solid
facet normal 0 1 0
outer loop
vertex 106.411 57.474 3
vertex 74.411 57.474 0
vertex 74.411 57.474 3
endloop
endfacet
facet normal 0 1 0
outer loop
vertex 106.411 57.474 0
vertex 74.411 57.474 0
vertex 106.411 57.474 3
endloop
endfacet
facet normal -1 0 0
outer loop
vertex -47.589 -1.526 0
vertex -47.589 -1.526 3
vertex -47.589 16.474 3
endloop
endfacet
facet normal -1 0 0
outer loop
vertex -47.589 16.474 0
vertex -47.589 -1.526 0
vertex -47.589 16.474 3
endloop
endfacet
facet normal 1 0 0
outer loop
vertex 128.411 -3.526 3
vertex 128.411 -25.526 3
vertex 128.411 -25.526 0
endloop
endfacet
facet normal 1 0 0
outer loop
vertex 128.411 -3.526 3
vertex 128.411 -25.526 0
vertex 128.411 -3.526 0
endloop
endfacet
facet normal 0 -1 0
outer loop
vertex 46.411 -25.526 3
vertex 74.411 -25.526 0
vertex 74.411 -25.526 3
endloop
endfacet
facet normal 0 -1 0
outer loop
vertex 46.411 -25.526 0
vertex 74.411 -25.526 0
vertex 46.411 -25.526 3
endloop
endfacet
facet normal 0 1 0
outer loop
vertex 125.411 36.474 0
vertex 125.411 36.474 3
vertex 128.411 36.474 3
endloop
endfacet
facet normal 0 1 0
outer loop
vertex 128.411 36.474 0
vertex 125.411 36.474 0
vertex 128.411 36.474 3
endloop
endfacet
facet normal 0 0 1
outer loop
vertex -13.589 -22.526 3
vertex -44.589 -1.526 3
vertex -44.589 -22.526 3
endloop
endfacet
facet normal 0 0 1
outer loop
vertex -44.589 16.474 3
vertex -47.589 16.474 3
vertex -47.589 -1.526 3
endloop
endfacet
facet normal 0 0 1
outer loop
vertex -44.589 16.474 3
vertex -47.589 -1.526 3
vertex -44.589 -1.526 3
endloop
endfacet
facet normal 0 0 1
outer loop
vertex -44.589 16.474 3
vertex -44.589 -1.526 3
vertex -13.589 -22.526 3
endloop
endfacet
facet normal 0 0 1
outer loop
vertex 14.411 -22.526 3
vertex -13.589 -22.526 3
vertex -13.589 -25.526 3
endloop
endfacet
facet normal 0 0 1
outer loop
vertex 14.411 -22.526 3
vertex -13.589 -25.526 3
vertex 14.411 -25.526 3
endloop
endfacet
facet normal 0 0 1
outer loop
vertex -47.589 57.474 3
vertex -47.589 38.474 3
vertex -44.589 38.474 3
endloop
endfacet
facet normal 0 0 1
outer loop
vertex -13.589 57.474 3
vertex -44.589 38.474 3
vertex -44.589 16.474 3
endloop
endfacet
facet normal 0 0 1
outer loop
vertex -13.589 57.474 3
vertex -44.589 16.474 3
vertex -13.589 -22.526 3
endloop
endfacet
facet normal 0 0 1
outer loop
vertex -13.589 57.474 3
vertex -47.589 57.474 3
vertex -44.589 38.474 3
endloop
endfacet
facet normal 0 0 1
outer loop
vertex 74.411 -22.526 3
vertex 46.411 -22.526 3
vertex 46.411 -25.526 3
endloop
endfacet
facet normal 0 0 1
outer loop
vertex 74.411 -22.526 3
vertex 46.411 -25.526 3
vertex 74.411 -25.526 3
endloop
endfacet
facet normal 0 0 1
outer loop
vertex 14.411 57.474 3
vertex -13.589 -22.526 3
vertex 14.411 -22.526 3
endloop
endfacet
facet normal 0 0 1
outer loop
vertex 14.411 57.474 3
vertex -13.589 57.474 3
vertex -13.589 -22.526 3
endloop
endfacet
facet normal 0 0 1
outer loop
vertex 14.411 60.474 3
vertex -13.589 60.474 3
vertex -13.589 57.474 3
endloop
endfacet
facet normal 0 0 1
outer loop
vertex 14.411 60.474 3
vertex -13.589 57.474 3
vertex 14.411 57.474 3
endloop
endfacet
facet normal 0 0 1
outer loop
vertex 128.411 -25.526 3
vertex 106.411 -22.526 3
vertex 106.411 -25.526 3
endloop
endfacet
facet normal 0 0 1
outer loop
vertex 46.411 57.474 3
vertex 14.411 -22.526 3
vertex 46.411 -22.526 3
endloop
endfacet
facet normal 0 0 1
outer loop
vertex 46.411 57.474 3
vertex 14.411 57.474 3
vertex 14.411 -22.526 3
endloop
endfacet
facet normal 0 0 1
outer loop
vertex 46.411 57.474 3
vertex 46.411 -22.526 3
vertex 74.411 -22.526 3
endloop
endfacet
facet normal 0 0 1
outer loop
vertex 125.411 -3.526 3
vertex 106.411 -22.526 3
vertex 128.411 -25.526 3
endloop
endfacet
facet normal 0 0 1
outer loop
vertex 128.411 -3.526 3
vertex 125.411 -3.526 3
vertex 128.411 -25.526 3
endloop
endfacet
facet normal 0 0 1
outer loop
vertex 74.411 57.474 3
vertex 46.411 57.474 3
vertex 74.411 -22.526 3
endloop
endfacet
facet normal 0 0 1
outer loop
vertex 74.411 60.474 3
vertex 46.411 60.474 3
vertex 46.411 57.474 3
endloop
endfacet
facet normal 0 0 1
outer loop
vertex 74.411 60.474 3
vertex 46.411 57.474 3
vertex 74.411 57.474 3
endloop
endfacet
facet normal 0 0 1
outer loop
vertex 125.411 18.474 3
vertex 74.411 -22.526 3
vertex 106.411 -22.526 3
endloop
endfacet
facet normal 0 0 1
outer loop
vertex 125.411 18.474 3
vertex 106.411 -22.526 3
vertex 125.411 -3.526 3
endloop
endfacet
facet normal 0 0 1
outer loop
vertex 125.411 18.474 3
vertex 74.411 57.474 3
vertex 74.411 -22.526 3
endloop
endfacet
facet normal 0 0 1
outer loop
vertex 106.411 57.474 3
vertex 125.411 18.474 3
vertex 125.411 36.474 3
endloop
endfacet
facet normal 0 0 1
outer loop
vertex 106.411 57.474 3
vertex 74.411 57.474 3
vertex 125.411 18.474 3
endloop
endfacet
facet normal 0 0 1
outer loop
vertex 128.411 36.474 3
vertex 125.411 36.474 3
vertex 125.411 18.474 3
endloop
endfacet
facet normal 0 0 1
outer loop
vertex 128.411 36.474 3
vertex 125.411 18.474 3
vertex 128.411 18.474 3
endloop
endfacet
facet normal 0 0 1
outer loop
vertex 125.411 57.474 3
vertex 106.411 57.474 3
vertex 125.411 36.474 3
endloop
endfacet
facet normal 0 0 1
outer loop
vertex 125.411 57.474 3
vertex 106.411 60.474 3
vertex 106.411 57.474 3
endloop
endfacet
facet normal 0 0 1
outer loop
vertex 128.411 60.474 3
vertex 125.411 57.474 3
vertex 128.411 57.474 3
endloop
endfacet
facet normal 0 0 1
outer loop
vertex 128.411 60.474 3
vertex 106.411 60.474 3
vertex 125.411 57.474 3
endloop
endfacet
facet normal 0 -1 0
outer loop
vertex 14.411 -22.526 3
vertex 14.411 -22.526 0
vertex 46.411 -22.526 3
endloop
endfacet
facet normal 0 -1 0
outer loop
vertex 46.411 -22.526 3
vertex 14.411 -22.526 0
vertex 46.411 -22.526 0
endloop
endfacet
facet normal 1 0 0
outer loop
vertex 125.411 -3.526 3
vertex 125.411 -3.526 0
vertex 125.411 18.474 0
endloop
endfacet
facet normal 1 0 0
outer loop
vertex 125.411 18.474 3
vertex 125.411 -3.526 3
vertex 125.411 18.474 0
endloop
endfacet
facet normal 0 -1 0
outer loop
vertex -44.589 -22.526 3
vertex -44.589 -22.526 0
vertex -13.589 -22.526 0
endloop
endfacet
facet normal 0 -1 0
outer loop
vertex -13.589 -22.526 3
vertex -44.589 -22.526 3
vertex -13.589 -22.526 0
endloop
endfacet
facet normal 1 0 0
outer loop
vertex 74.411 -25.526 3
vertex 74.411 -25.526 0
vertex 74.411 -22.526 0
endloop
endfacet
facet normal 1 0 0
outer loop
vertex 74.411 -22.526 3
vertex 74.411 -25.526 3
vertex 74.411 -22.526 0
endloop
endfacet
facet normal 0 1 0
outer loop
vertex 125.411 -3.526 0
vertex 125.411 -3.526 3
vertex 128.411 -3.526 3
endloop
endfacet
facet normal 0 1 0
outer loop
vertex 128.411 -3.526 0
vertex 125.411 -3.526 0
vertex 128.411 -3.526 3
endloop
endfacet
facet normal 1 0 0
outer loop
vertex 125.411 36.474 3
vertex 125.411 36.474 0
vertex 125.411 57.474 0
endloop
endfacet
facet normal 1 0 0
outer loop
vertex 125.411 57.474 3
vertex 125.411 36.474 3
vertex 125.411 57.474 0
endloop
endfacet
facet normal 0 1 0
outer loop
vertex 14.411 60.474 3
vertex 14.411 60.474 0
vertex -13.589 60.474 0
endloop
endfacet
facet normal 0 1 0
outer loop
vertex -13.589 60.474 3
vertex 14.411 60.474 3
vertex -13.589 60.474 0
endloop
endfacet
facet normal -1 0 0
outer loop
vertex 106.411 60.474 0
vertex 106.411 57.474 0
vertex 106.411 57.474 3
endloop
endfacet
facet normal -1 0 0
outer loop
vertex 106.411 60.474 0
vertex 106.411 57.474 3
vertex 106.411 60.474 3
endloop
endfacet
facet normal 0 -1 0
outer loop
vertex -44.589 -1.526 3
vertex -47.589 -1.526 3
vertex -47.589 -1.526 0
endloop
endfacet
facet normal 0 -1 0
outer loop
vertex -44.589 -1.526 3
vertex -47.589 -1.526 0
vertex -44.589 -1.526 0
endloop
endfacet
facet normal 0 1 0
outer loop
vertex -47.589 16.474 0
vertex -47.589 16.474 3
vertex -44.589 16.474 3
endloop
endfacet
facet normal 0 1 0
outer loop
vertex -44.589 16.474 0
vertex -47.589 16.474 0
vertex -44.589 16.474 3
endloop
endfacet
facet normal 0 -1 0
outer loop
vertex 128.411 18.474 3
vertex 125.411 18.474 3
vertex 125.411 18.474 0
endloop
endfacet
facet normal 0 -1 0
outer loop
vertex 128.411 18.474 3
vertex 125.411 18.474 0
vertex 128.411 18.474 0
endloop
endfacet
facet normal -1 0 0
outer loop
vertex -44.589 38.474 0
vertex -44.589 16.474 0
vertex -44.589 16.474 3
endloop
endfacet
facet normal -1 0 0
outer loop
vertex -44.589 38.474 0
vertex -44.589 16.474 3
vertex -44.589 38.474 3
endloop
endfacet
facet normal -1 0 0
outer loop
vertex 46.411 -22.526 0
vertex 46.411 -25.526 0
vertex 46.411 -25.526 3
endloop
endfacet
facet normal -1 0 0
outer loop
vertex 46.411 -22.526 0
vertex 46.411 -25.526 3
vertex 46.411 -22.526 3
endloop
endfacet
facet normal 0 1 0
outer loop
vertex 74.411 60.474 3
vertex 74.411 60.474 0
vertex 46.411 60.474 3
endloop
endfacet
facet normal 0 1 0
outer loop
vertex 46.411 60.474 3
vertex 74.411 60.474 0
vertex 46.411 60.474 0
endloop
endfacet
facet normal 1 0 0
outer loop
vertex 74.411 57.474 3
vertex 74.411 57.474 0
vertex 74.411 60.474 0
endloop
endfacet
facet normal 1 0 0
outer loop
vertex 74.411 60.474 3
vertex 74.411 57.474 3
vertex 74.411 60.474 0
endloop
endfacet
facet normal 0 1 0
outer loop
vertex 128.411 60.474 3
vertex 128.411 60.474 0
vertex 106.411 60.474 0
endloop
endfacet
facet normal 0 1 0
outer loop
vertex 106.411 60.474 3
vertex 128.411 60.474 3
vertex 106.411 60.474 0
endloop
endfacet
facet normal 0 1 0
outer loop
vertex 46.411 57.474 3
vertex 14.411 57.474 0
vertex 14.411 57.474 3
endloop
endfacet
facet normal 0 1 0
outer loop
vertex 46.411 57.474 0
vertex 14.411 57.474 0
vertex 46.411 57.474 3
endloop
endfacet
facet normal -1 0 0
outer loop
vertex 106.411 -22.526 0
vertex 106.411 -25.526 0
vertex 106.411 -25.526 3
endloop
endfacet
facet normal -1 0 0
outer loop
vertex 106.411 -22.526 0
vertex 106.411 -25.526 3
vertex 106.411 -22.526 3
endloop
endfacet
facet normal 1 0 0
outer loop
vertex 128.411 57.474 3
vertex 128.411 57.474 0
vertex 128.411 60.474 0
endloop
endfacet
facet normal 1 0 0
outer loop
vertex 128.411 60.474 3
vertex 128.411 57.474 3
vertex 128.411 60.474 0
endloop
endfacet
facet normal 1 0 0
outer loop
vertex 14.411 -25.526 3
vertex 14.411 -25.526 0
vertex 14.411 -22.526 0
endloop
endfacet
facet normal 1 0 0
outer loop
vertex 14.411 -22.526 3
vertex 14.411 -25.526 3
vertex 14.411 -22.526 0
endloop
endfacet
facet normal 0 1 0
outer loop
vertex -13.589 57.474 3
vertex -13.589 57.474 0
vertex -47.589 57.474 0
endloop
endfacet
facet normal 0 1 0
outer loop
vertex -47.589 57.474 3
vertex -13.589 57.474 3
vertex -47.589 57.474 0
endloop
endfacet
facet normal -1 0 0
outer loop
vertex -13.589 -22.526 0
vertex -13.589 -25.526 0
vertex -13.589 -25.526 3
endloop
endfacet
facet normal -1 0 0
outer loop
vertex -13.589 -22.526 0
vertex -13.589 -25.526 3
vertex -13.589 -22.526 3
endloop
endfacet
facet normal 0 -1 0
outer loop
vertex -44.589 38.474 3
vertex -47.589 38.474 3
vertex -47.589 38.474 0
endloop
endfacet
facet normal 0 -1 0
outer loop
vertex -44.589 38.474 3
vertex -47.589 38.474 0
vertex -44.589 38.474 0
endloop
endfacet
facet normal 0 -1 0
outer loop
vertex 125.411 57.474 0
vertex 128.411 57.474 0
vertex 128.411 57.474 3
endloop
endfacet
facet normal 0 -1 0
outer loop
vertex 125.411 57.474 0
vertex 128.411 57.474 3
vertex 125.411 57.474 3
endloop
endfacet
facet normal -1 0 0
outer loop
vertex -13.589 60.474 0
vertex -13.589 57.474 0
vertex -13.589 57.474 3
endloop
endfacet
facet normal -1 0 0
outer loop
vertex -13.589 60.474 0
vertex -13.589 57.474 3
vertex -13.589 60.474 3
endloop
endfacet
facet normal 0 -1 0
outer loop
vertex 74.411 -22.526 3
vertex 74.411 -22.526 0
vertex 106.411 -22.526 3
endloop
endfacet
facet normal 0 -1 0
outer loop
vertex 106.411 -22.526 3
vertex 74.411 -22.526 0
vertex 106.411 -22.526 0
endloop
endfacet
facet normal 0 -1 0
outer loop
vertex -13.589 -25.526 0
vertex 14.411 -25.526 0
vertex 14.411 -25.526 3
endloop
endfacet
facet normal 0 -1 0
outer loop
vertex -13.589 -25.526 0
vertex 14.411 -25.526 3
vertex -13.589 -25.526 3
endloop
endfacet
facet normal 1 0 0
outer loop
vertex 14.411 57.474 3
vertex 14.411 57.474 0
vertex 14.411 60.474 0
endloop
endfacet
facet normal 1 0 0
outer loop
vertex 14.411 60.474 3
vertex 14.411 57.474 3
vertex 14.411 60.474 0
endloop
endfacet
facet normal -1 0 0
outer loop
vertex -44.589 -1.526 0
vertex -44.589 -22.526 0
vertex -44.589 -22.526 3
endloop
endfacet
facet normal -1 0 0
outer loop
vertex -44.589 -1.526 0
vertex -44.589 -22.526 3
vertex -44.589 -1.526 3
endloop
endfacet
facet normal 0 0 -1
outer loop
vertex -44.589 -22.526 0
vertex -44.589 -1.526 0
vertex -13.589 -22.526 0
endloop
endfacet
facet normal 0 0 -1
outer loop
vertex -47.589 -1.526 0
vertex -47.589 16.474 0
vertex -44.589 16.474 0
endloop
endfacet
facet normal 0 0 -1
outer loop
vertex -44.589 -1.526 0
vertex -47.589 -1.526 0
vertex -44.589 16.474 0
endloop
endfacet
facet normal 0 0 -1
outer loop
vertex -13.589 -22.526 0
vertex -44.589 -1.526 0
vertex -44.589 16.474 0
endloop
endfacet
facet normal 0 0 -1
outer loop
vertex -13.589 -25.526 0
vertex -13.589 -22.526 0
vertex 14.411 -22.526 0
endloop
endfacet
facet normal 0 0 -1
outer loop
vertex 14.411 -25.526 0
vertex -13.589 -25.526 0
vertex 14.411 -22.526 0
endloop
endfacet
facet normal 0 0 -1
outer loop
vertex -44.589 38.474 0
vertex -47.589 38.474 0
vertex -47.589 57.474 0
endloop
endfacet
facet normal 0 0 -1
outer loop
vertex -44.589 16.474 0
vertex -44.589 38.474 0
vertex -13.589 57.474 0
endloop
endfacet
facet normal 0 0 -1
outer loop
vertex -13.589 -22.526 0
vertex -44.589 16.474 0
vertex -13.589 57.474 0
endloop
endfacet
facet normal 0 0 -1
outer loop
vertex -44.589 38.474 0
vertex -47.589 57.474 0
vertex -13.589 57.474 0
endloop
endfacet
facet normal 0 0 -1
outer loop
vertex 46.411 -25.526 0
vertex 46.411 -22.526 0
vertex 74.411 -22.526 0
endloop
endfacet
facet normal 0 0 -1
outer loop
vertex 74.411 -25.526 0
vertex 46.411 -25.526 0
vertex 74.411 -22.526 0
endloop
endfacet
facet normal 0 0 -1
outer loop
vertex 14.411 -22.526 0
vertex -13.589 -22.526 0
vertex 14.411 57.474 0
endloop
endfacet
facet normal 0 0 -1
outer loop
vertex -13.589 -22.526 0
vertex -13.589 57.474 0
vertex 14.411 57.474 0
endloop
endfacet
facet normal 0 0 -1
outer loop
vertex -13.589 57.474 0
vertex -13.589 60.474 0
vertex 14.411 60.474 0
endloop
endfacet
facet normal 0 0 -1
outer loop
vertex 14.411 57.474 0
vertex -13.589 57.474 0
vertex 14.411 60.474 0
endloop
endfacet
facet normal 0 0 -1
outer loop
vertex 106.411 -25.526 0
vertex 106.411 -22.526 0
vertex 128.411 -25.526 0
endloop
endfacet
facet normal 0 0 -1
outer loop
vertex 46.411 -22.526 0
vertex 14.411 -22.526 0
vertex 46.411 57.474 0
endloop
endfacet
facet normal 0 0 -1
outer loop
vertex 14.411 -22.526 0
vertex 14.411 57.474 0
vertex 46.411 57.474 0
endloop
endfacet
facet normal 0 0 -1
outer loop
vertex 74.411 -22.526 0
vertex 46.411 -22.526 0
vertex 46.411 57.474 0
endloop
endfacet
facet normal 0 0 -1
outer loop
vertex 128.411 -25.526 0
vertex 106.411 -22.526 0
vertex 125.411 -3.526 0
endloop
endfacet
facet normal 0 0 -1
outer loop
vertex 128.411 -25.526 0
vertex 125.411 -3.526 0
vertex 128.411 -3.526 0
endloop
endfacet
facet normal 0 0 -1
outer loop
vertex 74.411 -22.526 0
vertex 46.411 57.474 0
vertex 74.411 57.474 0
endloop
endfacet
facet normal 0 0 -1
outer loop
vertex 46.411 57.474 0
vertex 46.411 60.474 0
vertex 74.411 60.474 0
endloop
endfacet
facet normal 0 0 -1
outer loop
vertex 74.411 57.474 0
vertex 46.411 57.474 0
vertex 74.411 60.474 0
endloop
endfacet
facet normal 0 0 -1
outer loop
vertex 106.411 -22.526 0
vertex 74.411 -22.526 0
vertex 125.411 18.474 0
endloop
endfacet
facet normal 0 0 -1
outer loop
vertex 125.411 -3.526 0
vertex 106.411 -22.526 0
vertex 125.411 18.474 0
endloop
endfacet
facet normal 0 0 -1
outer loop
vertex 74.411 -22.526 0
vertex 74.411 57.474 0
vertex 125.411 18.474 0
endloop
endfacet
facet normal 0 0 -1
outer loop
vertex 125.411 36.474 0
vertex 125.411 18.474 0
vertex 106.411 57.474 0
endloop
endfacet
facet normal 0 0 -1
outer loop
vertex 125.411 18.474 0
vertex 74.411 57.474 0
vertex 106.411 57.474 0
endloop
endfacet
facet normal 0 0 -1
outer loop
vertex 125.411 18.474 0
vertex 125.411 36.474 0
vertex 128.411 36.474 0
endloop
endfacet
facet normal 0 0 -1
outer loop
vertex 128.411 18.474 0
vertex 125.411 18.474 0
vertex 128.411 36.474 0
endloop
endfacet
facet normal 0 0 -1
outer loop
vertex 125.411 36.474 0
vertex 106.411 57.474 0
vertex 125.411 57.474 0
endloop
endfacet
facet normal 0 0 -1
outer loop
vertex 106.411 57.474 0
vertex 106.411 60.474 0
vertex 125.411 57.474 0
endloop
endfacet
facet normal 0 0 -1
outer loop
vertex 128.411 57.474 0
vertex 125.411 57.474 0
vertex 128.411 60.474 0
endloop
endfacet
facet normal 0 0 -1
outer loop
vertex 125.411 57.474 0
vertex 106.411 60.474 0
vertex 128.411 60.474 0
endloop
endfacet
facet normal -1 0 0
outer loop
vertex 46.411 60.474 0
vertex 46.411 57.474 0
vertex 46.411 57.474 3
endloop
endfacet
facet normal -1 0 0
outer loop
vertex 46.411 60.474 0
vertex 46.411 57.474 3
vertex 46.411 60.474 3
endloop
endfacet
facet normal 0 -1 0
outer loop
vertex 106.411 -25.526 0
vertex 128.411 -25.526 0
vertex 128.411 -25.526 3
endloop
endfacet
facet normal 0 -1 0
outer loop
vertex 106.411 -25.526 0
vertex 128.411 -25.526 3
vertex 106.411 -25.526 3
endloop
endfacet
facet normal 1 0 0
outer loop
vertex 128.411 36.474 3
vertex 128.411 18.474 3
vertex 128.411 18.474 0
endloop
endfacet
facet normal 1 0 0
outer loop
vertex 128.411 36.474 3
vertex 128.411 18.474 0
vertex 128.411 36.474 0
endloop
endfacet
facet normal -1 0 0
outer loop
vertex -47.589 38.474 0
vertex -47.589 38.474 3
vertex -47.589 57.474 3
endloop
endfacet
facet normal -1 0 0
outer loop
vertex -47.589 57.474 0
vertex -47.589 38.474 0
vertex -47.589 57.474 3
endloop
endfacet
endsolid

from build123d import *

# Parameters (mm, degrees)
ESQUISSE1_W             = 170
ESQUISSE1_H             = 80
BOSS_EXTRU_1_DEPTH      = 3
ESQUISSE3_W             = 28
ESQUISSE3_H             = 3
ESQUISSE3_W_2           = 22
BOSS_EXTRU_2_DEPTH      = 3
ESQUISSE4_W             = 3
ESQUISSE4_H             = 19
ESQUISSE4_H_2           = 18
ESQUISSE4_H_3           = 19.233956883
BOSS_EXTRU_3_DEPTH      = 3
ESQUISSE5_W             = 3.071340823
ESQUISSE5_H             = 0.315544452
ENL_V_MAT_EXTRU_1_DEPTH = 3


with BuildPart() as part:
    # Esquisse1 → Boss.-Extru.1 (new body)
    with BuildSketch(Plane.XY):
        with Locations((40.41093995, 17.47440273)):
            Rectangle(ESQUISSE1_W, ESQUISSE1_H)
    extrude(amount=BOSS_EXTRU_1_DEPTH)

    # Esquisse3 → Boss.-Extru.2 (add)
    with BuildSketch(Plane(origin=(0, 0, 0), x_dir=(-1, 0, 0), z_dir=(0, 0, -1))):
        with Locations((-0.41093995, 58.97440273)):
            Rectangle(ESQUISSE3_W, ESQUISSE3_H)
        with Locations((-60.41093995, 58.97440273)):
            Rectangle(ESQUISSE3_W, ESQUISSE3_H)
        with Locations((-117.41093995, 58.97440273)):
            Rectangle(ESQUISSE3_W_2, ESQUISSE3_H)
        with Locations((-117.41093995, -24.02559727)):
            Rectangle(ESQUISSE3_W_2, ESQUISSE3_H)
        with Locations((-60.41093995, -24.02559727)):
            Rectangle(ESQUISSE3_W, ESQUISSE3_H)
        with Locations((-0.41093995, -24.02559727)):
            Rectangle(ESQUISSE3_W, ESQUISSE3_H)
    extrude(amount=-BOSS_EXTRU_2_DEPTH)

    # Esquisse4 → Boss.-Extru.3 (add)
    with BuildSketch(Plane.XY.offset(3)):
        with Locations((126.91093995, -13.02559727)):
            Rectangle(ESQUISSE4_W, ESQUISSE4_H)
        with Locations((126.91093995, 27.47440273)):
            Rectangle(ESQUISSE4_W, ESQUISSE4_H_2)
        with Locations((-46.08906005, 48.091381172)):
            Rectangle(ESQUISSE4_W, ESQUISSE4_H_3)
        with Locations((-46.08906005, 7.47440273)):
            Rectangle(ESQUISSE4_W, ESQUISSE4_H_2)
    extrude(amount=-BOSS_EXTRU_3_DEPTH)

    # Esquisse5 → Enlèv. mat.-Extru.1 (cut)
    with BuildSketch(Plane(origin=(0, 0, 0), x_dir=(-1, 0, 0), z_dir=(0, 0, -1))):
        with Locations((46.124730462, 57.632174956)):
            Rectangle(ESQUISSE5_W, ESQUISSE5_H)
    extrude(amount=-ENL_V_MAT_EXTRU_1_DEPTH, mode=Mode.SUBTRACT)


solid = part.part
